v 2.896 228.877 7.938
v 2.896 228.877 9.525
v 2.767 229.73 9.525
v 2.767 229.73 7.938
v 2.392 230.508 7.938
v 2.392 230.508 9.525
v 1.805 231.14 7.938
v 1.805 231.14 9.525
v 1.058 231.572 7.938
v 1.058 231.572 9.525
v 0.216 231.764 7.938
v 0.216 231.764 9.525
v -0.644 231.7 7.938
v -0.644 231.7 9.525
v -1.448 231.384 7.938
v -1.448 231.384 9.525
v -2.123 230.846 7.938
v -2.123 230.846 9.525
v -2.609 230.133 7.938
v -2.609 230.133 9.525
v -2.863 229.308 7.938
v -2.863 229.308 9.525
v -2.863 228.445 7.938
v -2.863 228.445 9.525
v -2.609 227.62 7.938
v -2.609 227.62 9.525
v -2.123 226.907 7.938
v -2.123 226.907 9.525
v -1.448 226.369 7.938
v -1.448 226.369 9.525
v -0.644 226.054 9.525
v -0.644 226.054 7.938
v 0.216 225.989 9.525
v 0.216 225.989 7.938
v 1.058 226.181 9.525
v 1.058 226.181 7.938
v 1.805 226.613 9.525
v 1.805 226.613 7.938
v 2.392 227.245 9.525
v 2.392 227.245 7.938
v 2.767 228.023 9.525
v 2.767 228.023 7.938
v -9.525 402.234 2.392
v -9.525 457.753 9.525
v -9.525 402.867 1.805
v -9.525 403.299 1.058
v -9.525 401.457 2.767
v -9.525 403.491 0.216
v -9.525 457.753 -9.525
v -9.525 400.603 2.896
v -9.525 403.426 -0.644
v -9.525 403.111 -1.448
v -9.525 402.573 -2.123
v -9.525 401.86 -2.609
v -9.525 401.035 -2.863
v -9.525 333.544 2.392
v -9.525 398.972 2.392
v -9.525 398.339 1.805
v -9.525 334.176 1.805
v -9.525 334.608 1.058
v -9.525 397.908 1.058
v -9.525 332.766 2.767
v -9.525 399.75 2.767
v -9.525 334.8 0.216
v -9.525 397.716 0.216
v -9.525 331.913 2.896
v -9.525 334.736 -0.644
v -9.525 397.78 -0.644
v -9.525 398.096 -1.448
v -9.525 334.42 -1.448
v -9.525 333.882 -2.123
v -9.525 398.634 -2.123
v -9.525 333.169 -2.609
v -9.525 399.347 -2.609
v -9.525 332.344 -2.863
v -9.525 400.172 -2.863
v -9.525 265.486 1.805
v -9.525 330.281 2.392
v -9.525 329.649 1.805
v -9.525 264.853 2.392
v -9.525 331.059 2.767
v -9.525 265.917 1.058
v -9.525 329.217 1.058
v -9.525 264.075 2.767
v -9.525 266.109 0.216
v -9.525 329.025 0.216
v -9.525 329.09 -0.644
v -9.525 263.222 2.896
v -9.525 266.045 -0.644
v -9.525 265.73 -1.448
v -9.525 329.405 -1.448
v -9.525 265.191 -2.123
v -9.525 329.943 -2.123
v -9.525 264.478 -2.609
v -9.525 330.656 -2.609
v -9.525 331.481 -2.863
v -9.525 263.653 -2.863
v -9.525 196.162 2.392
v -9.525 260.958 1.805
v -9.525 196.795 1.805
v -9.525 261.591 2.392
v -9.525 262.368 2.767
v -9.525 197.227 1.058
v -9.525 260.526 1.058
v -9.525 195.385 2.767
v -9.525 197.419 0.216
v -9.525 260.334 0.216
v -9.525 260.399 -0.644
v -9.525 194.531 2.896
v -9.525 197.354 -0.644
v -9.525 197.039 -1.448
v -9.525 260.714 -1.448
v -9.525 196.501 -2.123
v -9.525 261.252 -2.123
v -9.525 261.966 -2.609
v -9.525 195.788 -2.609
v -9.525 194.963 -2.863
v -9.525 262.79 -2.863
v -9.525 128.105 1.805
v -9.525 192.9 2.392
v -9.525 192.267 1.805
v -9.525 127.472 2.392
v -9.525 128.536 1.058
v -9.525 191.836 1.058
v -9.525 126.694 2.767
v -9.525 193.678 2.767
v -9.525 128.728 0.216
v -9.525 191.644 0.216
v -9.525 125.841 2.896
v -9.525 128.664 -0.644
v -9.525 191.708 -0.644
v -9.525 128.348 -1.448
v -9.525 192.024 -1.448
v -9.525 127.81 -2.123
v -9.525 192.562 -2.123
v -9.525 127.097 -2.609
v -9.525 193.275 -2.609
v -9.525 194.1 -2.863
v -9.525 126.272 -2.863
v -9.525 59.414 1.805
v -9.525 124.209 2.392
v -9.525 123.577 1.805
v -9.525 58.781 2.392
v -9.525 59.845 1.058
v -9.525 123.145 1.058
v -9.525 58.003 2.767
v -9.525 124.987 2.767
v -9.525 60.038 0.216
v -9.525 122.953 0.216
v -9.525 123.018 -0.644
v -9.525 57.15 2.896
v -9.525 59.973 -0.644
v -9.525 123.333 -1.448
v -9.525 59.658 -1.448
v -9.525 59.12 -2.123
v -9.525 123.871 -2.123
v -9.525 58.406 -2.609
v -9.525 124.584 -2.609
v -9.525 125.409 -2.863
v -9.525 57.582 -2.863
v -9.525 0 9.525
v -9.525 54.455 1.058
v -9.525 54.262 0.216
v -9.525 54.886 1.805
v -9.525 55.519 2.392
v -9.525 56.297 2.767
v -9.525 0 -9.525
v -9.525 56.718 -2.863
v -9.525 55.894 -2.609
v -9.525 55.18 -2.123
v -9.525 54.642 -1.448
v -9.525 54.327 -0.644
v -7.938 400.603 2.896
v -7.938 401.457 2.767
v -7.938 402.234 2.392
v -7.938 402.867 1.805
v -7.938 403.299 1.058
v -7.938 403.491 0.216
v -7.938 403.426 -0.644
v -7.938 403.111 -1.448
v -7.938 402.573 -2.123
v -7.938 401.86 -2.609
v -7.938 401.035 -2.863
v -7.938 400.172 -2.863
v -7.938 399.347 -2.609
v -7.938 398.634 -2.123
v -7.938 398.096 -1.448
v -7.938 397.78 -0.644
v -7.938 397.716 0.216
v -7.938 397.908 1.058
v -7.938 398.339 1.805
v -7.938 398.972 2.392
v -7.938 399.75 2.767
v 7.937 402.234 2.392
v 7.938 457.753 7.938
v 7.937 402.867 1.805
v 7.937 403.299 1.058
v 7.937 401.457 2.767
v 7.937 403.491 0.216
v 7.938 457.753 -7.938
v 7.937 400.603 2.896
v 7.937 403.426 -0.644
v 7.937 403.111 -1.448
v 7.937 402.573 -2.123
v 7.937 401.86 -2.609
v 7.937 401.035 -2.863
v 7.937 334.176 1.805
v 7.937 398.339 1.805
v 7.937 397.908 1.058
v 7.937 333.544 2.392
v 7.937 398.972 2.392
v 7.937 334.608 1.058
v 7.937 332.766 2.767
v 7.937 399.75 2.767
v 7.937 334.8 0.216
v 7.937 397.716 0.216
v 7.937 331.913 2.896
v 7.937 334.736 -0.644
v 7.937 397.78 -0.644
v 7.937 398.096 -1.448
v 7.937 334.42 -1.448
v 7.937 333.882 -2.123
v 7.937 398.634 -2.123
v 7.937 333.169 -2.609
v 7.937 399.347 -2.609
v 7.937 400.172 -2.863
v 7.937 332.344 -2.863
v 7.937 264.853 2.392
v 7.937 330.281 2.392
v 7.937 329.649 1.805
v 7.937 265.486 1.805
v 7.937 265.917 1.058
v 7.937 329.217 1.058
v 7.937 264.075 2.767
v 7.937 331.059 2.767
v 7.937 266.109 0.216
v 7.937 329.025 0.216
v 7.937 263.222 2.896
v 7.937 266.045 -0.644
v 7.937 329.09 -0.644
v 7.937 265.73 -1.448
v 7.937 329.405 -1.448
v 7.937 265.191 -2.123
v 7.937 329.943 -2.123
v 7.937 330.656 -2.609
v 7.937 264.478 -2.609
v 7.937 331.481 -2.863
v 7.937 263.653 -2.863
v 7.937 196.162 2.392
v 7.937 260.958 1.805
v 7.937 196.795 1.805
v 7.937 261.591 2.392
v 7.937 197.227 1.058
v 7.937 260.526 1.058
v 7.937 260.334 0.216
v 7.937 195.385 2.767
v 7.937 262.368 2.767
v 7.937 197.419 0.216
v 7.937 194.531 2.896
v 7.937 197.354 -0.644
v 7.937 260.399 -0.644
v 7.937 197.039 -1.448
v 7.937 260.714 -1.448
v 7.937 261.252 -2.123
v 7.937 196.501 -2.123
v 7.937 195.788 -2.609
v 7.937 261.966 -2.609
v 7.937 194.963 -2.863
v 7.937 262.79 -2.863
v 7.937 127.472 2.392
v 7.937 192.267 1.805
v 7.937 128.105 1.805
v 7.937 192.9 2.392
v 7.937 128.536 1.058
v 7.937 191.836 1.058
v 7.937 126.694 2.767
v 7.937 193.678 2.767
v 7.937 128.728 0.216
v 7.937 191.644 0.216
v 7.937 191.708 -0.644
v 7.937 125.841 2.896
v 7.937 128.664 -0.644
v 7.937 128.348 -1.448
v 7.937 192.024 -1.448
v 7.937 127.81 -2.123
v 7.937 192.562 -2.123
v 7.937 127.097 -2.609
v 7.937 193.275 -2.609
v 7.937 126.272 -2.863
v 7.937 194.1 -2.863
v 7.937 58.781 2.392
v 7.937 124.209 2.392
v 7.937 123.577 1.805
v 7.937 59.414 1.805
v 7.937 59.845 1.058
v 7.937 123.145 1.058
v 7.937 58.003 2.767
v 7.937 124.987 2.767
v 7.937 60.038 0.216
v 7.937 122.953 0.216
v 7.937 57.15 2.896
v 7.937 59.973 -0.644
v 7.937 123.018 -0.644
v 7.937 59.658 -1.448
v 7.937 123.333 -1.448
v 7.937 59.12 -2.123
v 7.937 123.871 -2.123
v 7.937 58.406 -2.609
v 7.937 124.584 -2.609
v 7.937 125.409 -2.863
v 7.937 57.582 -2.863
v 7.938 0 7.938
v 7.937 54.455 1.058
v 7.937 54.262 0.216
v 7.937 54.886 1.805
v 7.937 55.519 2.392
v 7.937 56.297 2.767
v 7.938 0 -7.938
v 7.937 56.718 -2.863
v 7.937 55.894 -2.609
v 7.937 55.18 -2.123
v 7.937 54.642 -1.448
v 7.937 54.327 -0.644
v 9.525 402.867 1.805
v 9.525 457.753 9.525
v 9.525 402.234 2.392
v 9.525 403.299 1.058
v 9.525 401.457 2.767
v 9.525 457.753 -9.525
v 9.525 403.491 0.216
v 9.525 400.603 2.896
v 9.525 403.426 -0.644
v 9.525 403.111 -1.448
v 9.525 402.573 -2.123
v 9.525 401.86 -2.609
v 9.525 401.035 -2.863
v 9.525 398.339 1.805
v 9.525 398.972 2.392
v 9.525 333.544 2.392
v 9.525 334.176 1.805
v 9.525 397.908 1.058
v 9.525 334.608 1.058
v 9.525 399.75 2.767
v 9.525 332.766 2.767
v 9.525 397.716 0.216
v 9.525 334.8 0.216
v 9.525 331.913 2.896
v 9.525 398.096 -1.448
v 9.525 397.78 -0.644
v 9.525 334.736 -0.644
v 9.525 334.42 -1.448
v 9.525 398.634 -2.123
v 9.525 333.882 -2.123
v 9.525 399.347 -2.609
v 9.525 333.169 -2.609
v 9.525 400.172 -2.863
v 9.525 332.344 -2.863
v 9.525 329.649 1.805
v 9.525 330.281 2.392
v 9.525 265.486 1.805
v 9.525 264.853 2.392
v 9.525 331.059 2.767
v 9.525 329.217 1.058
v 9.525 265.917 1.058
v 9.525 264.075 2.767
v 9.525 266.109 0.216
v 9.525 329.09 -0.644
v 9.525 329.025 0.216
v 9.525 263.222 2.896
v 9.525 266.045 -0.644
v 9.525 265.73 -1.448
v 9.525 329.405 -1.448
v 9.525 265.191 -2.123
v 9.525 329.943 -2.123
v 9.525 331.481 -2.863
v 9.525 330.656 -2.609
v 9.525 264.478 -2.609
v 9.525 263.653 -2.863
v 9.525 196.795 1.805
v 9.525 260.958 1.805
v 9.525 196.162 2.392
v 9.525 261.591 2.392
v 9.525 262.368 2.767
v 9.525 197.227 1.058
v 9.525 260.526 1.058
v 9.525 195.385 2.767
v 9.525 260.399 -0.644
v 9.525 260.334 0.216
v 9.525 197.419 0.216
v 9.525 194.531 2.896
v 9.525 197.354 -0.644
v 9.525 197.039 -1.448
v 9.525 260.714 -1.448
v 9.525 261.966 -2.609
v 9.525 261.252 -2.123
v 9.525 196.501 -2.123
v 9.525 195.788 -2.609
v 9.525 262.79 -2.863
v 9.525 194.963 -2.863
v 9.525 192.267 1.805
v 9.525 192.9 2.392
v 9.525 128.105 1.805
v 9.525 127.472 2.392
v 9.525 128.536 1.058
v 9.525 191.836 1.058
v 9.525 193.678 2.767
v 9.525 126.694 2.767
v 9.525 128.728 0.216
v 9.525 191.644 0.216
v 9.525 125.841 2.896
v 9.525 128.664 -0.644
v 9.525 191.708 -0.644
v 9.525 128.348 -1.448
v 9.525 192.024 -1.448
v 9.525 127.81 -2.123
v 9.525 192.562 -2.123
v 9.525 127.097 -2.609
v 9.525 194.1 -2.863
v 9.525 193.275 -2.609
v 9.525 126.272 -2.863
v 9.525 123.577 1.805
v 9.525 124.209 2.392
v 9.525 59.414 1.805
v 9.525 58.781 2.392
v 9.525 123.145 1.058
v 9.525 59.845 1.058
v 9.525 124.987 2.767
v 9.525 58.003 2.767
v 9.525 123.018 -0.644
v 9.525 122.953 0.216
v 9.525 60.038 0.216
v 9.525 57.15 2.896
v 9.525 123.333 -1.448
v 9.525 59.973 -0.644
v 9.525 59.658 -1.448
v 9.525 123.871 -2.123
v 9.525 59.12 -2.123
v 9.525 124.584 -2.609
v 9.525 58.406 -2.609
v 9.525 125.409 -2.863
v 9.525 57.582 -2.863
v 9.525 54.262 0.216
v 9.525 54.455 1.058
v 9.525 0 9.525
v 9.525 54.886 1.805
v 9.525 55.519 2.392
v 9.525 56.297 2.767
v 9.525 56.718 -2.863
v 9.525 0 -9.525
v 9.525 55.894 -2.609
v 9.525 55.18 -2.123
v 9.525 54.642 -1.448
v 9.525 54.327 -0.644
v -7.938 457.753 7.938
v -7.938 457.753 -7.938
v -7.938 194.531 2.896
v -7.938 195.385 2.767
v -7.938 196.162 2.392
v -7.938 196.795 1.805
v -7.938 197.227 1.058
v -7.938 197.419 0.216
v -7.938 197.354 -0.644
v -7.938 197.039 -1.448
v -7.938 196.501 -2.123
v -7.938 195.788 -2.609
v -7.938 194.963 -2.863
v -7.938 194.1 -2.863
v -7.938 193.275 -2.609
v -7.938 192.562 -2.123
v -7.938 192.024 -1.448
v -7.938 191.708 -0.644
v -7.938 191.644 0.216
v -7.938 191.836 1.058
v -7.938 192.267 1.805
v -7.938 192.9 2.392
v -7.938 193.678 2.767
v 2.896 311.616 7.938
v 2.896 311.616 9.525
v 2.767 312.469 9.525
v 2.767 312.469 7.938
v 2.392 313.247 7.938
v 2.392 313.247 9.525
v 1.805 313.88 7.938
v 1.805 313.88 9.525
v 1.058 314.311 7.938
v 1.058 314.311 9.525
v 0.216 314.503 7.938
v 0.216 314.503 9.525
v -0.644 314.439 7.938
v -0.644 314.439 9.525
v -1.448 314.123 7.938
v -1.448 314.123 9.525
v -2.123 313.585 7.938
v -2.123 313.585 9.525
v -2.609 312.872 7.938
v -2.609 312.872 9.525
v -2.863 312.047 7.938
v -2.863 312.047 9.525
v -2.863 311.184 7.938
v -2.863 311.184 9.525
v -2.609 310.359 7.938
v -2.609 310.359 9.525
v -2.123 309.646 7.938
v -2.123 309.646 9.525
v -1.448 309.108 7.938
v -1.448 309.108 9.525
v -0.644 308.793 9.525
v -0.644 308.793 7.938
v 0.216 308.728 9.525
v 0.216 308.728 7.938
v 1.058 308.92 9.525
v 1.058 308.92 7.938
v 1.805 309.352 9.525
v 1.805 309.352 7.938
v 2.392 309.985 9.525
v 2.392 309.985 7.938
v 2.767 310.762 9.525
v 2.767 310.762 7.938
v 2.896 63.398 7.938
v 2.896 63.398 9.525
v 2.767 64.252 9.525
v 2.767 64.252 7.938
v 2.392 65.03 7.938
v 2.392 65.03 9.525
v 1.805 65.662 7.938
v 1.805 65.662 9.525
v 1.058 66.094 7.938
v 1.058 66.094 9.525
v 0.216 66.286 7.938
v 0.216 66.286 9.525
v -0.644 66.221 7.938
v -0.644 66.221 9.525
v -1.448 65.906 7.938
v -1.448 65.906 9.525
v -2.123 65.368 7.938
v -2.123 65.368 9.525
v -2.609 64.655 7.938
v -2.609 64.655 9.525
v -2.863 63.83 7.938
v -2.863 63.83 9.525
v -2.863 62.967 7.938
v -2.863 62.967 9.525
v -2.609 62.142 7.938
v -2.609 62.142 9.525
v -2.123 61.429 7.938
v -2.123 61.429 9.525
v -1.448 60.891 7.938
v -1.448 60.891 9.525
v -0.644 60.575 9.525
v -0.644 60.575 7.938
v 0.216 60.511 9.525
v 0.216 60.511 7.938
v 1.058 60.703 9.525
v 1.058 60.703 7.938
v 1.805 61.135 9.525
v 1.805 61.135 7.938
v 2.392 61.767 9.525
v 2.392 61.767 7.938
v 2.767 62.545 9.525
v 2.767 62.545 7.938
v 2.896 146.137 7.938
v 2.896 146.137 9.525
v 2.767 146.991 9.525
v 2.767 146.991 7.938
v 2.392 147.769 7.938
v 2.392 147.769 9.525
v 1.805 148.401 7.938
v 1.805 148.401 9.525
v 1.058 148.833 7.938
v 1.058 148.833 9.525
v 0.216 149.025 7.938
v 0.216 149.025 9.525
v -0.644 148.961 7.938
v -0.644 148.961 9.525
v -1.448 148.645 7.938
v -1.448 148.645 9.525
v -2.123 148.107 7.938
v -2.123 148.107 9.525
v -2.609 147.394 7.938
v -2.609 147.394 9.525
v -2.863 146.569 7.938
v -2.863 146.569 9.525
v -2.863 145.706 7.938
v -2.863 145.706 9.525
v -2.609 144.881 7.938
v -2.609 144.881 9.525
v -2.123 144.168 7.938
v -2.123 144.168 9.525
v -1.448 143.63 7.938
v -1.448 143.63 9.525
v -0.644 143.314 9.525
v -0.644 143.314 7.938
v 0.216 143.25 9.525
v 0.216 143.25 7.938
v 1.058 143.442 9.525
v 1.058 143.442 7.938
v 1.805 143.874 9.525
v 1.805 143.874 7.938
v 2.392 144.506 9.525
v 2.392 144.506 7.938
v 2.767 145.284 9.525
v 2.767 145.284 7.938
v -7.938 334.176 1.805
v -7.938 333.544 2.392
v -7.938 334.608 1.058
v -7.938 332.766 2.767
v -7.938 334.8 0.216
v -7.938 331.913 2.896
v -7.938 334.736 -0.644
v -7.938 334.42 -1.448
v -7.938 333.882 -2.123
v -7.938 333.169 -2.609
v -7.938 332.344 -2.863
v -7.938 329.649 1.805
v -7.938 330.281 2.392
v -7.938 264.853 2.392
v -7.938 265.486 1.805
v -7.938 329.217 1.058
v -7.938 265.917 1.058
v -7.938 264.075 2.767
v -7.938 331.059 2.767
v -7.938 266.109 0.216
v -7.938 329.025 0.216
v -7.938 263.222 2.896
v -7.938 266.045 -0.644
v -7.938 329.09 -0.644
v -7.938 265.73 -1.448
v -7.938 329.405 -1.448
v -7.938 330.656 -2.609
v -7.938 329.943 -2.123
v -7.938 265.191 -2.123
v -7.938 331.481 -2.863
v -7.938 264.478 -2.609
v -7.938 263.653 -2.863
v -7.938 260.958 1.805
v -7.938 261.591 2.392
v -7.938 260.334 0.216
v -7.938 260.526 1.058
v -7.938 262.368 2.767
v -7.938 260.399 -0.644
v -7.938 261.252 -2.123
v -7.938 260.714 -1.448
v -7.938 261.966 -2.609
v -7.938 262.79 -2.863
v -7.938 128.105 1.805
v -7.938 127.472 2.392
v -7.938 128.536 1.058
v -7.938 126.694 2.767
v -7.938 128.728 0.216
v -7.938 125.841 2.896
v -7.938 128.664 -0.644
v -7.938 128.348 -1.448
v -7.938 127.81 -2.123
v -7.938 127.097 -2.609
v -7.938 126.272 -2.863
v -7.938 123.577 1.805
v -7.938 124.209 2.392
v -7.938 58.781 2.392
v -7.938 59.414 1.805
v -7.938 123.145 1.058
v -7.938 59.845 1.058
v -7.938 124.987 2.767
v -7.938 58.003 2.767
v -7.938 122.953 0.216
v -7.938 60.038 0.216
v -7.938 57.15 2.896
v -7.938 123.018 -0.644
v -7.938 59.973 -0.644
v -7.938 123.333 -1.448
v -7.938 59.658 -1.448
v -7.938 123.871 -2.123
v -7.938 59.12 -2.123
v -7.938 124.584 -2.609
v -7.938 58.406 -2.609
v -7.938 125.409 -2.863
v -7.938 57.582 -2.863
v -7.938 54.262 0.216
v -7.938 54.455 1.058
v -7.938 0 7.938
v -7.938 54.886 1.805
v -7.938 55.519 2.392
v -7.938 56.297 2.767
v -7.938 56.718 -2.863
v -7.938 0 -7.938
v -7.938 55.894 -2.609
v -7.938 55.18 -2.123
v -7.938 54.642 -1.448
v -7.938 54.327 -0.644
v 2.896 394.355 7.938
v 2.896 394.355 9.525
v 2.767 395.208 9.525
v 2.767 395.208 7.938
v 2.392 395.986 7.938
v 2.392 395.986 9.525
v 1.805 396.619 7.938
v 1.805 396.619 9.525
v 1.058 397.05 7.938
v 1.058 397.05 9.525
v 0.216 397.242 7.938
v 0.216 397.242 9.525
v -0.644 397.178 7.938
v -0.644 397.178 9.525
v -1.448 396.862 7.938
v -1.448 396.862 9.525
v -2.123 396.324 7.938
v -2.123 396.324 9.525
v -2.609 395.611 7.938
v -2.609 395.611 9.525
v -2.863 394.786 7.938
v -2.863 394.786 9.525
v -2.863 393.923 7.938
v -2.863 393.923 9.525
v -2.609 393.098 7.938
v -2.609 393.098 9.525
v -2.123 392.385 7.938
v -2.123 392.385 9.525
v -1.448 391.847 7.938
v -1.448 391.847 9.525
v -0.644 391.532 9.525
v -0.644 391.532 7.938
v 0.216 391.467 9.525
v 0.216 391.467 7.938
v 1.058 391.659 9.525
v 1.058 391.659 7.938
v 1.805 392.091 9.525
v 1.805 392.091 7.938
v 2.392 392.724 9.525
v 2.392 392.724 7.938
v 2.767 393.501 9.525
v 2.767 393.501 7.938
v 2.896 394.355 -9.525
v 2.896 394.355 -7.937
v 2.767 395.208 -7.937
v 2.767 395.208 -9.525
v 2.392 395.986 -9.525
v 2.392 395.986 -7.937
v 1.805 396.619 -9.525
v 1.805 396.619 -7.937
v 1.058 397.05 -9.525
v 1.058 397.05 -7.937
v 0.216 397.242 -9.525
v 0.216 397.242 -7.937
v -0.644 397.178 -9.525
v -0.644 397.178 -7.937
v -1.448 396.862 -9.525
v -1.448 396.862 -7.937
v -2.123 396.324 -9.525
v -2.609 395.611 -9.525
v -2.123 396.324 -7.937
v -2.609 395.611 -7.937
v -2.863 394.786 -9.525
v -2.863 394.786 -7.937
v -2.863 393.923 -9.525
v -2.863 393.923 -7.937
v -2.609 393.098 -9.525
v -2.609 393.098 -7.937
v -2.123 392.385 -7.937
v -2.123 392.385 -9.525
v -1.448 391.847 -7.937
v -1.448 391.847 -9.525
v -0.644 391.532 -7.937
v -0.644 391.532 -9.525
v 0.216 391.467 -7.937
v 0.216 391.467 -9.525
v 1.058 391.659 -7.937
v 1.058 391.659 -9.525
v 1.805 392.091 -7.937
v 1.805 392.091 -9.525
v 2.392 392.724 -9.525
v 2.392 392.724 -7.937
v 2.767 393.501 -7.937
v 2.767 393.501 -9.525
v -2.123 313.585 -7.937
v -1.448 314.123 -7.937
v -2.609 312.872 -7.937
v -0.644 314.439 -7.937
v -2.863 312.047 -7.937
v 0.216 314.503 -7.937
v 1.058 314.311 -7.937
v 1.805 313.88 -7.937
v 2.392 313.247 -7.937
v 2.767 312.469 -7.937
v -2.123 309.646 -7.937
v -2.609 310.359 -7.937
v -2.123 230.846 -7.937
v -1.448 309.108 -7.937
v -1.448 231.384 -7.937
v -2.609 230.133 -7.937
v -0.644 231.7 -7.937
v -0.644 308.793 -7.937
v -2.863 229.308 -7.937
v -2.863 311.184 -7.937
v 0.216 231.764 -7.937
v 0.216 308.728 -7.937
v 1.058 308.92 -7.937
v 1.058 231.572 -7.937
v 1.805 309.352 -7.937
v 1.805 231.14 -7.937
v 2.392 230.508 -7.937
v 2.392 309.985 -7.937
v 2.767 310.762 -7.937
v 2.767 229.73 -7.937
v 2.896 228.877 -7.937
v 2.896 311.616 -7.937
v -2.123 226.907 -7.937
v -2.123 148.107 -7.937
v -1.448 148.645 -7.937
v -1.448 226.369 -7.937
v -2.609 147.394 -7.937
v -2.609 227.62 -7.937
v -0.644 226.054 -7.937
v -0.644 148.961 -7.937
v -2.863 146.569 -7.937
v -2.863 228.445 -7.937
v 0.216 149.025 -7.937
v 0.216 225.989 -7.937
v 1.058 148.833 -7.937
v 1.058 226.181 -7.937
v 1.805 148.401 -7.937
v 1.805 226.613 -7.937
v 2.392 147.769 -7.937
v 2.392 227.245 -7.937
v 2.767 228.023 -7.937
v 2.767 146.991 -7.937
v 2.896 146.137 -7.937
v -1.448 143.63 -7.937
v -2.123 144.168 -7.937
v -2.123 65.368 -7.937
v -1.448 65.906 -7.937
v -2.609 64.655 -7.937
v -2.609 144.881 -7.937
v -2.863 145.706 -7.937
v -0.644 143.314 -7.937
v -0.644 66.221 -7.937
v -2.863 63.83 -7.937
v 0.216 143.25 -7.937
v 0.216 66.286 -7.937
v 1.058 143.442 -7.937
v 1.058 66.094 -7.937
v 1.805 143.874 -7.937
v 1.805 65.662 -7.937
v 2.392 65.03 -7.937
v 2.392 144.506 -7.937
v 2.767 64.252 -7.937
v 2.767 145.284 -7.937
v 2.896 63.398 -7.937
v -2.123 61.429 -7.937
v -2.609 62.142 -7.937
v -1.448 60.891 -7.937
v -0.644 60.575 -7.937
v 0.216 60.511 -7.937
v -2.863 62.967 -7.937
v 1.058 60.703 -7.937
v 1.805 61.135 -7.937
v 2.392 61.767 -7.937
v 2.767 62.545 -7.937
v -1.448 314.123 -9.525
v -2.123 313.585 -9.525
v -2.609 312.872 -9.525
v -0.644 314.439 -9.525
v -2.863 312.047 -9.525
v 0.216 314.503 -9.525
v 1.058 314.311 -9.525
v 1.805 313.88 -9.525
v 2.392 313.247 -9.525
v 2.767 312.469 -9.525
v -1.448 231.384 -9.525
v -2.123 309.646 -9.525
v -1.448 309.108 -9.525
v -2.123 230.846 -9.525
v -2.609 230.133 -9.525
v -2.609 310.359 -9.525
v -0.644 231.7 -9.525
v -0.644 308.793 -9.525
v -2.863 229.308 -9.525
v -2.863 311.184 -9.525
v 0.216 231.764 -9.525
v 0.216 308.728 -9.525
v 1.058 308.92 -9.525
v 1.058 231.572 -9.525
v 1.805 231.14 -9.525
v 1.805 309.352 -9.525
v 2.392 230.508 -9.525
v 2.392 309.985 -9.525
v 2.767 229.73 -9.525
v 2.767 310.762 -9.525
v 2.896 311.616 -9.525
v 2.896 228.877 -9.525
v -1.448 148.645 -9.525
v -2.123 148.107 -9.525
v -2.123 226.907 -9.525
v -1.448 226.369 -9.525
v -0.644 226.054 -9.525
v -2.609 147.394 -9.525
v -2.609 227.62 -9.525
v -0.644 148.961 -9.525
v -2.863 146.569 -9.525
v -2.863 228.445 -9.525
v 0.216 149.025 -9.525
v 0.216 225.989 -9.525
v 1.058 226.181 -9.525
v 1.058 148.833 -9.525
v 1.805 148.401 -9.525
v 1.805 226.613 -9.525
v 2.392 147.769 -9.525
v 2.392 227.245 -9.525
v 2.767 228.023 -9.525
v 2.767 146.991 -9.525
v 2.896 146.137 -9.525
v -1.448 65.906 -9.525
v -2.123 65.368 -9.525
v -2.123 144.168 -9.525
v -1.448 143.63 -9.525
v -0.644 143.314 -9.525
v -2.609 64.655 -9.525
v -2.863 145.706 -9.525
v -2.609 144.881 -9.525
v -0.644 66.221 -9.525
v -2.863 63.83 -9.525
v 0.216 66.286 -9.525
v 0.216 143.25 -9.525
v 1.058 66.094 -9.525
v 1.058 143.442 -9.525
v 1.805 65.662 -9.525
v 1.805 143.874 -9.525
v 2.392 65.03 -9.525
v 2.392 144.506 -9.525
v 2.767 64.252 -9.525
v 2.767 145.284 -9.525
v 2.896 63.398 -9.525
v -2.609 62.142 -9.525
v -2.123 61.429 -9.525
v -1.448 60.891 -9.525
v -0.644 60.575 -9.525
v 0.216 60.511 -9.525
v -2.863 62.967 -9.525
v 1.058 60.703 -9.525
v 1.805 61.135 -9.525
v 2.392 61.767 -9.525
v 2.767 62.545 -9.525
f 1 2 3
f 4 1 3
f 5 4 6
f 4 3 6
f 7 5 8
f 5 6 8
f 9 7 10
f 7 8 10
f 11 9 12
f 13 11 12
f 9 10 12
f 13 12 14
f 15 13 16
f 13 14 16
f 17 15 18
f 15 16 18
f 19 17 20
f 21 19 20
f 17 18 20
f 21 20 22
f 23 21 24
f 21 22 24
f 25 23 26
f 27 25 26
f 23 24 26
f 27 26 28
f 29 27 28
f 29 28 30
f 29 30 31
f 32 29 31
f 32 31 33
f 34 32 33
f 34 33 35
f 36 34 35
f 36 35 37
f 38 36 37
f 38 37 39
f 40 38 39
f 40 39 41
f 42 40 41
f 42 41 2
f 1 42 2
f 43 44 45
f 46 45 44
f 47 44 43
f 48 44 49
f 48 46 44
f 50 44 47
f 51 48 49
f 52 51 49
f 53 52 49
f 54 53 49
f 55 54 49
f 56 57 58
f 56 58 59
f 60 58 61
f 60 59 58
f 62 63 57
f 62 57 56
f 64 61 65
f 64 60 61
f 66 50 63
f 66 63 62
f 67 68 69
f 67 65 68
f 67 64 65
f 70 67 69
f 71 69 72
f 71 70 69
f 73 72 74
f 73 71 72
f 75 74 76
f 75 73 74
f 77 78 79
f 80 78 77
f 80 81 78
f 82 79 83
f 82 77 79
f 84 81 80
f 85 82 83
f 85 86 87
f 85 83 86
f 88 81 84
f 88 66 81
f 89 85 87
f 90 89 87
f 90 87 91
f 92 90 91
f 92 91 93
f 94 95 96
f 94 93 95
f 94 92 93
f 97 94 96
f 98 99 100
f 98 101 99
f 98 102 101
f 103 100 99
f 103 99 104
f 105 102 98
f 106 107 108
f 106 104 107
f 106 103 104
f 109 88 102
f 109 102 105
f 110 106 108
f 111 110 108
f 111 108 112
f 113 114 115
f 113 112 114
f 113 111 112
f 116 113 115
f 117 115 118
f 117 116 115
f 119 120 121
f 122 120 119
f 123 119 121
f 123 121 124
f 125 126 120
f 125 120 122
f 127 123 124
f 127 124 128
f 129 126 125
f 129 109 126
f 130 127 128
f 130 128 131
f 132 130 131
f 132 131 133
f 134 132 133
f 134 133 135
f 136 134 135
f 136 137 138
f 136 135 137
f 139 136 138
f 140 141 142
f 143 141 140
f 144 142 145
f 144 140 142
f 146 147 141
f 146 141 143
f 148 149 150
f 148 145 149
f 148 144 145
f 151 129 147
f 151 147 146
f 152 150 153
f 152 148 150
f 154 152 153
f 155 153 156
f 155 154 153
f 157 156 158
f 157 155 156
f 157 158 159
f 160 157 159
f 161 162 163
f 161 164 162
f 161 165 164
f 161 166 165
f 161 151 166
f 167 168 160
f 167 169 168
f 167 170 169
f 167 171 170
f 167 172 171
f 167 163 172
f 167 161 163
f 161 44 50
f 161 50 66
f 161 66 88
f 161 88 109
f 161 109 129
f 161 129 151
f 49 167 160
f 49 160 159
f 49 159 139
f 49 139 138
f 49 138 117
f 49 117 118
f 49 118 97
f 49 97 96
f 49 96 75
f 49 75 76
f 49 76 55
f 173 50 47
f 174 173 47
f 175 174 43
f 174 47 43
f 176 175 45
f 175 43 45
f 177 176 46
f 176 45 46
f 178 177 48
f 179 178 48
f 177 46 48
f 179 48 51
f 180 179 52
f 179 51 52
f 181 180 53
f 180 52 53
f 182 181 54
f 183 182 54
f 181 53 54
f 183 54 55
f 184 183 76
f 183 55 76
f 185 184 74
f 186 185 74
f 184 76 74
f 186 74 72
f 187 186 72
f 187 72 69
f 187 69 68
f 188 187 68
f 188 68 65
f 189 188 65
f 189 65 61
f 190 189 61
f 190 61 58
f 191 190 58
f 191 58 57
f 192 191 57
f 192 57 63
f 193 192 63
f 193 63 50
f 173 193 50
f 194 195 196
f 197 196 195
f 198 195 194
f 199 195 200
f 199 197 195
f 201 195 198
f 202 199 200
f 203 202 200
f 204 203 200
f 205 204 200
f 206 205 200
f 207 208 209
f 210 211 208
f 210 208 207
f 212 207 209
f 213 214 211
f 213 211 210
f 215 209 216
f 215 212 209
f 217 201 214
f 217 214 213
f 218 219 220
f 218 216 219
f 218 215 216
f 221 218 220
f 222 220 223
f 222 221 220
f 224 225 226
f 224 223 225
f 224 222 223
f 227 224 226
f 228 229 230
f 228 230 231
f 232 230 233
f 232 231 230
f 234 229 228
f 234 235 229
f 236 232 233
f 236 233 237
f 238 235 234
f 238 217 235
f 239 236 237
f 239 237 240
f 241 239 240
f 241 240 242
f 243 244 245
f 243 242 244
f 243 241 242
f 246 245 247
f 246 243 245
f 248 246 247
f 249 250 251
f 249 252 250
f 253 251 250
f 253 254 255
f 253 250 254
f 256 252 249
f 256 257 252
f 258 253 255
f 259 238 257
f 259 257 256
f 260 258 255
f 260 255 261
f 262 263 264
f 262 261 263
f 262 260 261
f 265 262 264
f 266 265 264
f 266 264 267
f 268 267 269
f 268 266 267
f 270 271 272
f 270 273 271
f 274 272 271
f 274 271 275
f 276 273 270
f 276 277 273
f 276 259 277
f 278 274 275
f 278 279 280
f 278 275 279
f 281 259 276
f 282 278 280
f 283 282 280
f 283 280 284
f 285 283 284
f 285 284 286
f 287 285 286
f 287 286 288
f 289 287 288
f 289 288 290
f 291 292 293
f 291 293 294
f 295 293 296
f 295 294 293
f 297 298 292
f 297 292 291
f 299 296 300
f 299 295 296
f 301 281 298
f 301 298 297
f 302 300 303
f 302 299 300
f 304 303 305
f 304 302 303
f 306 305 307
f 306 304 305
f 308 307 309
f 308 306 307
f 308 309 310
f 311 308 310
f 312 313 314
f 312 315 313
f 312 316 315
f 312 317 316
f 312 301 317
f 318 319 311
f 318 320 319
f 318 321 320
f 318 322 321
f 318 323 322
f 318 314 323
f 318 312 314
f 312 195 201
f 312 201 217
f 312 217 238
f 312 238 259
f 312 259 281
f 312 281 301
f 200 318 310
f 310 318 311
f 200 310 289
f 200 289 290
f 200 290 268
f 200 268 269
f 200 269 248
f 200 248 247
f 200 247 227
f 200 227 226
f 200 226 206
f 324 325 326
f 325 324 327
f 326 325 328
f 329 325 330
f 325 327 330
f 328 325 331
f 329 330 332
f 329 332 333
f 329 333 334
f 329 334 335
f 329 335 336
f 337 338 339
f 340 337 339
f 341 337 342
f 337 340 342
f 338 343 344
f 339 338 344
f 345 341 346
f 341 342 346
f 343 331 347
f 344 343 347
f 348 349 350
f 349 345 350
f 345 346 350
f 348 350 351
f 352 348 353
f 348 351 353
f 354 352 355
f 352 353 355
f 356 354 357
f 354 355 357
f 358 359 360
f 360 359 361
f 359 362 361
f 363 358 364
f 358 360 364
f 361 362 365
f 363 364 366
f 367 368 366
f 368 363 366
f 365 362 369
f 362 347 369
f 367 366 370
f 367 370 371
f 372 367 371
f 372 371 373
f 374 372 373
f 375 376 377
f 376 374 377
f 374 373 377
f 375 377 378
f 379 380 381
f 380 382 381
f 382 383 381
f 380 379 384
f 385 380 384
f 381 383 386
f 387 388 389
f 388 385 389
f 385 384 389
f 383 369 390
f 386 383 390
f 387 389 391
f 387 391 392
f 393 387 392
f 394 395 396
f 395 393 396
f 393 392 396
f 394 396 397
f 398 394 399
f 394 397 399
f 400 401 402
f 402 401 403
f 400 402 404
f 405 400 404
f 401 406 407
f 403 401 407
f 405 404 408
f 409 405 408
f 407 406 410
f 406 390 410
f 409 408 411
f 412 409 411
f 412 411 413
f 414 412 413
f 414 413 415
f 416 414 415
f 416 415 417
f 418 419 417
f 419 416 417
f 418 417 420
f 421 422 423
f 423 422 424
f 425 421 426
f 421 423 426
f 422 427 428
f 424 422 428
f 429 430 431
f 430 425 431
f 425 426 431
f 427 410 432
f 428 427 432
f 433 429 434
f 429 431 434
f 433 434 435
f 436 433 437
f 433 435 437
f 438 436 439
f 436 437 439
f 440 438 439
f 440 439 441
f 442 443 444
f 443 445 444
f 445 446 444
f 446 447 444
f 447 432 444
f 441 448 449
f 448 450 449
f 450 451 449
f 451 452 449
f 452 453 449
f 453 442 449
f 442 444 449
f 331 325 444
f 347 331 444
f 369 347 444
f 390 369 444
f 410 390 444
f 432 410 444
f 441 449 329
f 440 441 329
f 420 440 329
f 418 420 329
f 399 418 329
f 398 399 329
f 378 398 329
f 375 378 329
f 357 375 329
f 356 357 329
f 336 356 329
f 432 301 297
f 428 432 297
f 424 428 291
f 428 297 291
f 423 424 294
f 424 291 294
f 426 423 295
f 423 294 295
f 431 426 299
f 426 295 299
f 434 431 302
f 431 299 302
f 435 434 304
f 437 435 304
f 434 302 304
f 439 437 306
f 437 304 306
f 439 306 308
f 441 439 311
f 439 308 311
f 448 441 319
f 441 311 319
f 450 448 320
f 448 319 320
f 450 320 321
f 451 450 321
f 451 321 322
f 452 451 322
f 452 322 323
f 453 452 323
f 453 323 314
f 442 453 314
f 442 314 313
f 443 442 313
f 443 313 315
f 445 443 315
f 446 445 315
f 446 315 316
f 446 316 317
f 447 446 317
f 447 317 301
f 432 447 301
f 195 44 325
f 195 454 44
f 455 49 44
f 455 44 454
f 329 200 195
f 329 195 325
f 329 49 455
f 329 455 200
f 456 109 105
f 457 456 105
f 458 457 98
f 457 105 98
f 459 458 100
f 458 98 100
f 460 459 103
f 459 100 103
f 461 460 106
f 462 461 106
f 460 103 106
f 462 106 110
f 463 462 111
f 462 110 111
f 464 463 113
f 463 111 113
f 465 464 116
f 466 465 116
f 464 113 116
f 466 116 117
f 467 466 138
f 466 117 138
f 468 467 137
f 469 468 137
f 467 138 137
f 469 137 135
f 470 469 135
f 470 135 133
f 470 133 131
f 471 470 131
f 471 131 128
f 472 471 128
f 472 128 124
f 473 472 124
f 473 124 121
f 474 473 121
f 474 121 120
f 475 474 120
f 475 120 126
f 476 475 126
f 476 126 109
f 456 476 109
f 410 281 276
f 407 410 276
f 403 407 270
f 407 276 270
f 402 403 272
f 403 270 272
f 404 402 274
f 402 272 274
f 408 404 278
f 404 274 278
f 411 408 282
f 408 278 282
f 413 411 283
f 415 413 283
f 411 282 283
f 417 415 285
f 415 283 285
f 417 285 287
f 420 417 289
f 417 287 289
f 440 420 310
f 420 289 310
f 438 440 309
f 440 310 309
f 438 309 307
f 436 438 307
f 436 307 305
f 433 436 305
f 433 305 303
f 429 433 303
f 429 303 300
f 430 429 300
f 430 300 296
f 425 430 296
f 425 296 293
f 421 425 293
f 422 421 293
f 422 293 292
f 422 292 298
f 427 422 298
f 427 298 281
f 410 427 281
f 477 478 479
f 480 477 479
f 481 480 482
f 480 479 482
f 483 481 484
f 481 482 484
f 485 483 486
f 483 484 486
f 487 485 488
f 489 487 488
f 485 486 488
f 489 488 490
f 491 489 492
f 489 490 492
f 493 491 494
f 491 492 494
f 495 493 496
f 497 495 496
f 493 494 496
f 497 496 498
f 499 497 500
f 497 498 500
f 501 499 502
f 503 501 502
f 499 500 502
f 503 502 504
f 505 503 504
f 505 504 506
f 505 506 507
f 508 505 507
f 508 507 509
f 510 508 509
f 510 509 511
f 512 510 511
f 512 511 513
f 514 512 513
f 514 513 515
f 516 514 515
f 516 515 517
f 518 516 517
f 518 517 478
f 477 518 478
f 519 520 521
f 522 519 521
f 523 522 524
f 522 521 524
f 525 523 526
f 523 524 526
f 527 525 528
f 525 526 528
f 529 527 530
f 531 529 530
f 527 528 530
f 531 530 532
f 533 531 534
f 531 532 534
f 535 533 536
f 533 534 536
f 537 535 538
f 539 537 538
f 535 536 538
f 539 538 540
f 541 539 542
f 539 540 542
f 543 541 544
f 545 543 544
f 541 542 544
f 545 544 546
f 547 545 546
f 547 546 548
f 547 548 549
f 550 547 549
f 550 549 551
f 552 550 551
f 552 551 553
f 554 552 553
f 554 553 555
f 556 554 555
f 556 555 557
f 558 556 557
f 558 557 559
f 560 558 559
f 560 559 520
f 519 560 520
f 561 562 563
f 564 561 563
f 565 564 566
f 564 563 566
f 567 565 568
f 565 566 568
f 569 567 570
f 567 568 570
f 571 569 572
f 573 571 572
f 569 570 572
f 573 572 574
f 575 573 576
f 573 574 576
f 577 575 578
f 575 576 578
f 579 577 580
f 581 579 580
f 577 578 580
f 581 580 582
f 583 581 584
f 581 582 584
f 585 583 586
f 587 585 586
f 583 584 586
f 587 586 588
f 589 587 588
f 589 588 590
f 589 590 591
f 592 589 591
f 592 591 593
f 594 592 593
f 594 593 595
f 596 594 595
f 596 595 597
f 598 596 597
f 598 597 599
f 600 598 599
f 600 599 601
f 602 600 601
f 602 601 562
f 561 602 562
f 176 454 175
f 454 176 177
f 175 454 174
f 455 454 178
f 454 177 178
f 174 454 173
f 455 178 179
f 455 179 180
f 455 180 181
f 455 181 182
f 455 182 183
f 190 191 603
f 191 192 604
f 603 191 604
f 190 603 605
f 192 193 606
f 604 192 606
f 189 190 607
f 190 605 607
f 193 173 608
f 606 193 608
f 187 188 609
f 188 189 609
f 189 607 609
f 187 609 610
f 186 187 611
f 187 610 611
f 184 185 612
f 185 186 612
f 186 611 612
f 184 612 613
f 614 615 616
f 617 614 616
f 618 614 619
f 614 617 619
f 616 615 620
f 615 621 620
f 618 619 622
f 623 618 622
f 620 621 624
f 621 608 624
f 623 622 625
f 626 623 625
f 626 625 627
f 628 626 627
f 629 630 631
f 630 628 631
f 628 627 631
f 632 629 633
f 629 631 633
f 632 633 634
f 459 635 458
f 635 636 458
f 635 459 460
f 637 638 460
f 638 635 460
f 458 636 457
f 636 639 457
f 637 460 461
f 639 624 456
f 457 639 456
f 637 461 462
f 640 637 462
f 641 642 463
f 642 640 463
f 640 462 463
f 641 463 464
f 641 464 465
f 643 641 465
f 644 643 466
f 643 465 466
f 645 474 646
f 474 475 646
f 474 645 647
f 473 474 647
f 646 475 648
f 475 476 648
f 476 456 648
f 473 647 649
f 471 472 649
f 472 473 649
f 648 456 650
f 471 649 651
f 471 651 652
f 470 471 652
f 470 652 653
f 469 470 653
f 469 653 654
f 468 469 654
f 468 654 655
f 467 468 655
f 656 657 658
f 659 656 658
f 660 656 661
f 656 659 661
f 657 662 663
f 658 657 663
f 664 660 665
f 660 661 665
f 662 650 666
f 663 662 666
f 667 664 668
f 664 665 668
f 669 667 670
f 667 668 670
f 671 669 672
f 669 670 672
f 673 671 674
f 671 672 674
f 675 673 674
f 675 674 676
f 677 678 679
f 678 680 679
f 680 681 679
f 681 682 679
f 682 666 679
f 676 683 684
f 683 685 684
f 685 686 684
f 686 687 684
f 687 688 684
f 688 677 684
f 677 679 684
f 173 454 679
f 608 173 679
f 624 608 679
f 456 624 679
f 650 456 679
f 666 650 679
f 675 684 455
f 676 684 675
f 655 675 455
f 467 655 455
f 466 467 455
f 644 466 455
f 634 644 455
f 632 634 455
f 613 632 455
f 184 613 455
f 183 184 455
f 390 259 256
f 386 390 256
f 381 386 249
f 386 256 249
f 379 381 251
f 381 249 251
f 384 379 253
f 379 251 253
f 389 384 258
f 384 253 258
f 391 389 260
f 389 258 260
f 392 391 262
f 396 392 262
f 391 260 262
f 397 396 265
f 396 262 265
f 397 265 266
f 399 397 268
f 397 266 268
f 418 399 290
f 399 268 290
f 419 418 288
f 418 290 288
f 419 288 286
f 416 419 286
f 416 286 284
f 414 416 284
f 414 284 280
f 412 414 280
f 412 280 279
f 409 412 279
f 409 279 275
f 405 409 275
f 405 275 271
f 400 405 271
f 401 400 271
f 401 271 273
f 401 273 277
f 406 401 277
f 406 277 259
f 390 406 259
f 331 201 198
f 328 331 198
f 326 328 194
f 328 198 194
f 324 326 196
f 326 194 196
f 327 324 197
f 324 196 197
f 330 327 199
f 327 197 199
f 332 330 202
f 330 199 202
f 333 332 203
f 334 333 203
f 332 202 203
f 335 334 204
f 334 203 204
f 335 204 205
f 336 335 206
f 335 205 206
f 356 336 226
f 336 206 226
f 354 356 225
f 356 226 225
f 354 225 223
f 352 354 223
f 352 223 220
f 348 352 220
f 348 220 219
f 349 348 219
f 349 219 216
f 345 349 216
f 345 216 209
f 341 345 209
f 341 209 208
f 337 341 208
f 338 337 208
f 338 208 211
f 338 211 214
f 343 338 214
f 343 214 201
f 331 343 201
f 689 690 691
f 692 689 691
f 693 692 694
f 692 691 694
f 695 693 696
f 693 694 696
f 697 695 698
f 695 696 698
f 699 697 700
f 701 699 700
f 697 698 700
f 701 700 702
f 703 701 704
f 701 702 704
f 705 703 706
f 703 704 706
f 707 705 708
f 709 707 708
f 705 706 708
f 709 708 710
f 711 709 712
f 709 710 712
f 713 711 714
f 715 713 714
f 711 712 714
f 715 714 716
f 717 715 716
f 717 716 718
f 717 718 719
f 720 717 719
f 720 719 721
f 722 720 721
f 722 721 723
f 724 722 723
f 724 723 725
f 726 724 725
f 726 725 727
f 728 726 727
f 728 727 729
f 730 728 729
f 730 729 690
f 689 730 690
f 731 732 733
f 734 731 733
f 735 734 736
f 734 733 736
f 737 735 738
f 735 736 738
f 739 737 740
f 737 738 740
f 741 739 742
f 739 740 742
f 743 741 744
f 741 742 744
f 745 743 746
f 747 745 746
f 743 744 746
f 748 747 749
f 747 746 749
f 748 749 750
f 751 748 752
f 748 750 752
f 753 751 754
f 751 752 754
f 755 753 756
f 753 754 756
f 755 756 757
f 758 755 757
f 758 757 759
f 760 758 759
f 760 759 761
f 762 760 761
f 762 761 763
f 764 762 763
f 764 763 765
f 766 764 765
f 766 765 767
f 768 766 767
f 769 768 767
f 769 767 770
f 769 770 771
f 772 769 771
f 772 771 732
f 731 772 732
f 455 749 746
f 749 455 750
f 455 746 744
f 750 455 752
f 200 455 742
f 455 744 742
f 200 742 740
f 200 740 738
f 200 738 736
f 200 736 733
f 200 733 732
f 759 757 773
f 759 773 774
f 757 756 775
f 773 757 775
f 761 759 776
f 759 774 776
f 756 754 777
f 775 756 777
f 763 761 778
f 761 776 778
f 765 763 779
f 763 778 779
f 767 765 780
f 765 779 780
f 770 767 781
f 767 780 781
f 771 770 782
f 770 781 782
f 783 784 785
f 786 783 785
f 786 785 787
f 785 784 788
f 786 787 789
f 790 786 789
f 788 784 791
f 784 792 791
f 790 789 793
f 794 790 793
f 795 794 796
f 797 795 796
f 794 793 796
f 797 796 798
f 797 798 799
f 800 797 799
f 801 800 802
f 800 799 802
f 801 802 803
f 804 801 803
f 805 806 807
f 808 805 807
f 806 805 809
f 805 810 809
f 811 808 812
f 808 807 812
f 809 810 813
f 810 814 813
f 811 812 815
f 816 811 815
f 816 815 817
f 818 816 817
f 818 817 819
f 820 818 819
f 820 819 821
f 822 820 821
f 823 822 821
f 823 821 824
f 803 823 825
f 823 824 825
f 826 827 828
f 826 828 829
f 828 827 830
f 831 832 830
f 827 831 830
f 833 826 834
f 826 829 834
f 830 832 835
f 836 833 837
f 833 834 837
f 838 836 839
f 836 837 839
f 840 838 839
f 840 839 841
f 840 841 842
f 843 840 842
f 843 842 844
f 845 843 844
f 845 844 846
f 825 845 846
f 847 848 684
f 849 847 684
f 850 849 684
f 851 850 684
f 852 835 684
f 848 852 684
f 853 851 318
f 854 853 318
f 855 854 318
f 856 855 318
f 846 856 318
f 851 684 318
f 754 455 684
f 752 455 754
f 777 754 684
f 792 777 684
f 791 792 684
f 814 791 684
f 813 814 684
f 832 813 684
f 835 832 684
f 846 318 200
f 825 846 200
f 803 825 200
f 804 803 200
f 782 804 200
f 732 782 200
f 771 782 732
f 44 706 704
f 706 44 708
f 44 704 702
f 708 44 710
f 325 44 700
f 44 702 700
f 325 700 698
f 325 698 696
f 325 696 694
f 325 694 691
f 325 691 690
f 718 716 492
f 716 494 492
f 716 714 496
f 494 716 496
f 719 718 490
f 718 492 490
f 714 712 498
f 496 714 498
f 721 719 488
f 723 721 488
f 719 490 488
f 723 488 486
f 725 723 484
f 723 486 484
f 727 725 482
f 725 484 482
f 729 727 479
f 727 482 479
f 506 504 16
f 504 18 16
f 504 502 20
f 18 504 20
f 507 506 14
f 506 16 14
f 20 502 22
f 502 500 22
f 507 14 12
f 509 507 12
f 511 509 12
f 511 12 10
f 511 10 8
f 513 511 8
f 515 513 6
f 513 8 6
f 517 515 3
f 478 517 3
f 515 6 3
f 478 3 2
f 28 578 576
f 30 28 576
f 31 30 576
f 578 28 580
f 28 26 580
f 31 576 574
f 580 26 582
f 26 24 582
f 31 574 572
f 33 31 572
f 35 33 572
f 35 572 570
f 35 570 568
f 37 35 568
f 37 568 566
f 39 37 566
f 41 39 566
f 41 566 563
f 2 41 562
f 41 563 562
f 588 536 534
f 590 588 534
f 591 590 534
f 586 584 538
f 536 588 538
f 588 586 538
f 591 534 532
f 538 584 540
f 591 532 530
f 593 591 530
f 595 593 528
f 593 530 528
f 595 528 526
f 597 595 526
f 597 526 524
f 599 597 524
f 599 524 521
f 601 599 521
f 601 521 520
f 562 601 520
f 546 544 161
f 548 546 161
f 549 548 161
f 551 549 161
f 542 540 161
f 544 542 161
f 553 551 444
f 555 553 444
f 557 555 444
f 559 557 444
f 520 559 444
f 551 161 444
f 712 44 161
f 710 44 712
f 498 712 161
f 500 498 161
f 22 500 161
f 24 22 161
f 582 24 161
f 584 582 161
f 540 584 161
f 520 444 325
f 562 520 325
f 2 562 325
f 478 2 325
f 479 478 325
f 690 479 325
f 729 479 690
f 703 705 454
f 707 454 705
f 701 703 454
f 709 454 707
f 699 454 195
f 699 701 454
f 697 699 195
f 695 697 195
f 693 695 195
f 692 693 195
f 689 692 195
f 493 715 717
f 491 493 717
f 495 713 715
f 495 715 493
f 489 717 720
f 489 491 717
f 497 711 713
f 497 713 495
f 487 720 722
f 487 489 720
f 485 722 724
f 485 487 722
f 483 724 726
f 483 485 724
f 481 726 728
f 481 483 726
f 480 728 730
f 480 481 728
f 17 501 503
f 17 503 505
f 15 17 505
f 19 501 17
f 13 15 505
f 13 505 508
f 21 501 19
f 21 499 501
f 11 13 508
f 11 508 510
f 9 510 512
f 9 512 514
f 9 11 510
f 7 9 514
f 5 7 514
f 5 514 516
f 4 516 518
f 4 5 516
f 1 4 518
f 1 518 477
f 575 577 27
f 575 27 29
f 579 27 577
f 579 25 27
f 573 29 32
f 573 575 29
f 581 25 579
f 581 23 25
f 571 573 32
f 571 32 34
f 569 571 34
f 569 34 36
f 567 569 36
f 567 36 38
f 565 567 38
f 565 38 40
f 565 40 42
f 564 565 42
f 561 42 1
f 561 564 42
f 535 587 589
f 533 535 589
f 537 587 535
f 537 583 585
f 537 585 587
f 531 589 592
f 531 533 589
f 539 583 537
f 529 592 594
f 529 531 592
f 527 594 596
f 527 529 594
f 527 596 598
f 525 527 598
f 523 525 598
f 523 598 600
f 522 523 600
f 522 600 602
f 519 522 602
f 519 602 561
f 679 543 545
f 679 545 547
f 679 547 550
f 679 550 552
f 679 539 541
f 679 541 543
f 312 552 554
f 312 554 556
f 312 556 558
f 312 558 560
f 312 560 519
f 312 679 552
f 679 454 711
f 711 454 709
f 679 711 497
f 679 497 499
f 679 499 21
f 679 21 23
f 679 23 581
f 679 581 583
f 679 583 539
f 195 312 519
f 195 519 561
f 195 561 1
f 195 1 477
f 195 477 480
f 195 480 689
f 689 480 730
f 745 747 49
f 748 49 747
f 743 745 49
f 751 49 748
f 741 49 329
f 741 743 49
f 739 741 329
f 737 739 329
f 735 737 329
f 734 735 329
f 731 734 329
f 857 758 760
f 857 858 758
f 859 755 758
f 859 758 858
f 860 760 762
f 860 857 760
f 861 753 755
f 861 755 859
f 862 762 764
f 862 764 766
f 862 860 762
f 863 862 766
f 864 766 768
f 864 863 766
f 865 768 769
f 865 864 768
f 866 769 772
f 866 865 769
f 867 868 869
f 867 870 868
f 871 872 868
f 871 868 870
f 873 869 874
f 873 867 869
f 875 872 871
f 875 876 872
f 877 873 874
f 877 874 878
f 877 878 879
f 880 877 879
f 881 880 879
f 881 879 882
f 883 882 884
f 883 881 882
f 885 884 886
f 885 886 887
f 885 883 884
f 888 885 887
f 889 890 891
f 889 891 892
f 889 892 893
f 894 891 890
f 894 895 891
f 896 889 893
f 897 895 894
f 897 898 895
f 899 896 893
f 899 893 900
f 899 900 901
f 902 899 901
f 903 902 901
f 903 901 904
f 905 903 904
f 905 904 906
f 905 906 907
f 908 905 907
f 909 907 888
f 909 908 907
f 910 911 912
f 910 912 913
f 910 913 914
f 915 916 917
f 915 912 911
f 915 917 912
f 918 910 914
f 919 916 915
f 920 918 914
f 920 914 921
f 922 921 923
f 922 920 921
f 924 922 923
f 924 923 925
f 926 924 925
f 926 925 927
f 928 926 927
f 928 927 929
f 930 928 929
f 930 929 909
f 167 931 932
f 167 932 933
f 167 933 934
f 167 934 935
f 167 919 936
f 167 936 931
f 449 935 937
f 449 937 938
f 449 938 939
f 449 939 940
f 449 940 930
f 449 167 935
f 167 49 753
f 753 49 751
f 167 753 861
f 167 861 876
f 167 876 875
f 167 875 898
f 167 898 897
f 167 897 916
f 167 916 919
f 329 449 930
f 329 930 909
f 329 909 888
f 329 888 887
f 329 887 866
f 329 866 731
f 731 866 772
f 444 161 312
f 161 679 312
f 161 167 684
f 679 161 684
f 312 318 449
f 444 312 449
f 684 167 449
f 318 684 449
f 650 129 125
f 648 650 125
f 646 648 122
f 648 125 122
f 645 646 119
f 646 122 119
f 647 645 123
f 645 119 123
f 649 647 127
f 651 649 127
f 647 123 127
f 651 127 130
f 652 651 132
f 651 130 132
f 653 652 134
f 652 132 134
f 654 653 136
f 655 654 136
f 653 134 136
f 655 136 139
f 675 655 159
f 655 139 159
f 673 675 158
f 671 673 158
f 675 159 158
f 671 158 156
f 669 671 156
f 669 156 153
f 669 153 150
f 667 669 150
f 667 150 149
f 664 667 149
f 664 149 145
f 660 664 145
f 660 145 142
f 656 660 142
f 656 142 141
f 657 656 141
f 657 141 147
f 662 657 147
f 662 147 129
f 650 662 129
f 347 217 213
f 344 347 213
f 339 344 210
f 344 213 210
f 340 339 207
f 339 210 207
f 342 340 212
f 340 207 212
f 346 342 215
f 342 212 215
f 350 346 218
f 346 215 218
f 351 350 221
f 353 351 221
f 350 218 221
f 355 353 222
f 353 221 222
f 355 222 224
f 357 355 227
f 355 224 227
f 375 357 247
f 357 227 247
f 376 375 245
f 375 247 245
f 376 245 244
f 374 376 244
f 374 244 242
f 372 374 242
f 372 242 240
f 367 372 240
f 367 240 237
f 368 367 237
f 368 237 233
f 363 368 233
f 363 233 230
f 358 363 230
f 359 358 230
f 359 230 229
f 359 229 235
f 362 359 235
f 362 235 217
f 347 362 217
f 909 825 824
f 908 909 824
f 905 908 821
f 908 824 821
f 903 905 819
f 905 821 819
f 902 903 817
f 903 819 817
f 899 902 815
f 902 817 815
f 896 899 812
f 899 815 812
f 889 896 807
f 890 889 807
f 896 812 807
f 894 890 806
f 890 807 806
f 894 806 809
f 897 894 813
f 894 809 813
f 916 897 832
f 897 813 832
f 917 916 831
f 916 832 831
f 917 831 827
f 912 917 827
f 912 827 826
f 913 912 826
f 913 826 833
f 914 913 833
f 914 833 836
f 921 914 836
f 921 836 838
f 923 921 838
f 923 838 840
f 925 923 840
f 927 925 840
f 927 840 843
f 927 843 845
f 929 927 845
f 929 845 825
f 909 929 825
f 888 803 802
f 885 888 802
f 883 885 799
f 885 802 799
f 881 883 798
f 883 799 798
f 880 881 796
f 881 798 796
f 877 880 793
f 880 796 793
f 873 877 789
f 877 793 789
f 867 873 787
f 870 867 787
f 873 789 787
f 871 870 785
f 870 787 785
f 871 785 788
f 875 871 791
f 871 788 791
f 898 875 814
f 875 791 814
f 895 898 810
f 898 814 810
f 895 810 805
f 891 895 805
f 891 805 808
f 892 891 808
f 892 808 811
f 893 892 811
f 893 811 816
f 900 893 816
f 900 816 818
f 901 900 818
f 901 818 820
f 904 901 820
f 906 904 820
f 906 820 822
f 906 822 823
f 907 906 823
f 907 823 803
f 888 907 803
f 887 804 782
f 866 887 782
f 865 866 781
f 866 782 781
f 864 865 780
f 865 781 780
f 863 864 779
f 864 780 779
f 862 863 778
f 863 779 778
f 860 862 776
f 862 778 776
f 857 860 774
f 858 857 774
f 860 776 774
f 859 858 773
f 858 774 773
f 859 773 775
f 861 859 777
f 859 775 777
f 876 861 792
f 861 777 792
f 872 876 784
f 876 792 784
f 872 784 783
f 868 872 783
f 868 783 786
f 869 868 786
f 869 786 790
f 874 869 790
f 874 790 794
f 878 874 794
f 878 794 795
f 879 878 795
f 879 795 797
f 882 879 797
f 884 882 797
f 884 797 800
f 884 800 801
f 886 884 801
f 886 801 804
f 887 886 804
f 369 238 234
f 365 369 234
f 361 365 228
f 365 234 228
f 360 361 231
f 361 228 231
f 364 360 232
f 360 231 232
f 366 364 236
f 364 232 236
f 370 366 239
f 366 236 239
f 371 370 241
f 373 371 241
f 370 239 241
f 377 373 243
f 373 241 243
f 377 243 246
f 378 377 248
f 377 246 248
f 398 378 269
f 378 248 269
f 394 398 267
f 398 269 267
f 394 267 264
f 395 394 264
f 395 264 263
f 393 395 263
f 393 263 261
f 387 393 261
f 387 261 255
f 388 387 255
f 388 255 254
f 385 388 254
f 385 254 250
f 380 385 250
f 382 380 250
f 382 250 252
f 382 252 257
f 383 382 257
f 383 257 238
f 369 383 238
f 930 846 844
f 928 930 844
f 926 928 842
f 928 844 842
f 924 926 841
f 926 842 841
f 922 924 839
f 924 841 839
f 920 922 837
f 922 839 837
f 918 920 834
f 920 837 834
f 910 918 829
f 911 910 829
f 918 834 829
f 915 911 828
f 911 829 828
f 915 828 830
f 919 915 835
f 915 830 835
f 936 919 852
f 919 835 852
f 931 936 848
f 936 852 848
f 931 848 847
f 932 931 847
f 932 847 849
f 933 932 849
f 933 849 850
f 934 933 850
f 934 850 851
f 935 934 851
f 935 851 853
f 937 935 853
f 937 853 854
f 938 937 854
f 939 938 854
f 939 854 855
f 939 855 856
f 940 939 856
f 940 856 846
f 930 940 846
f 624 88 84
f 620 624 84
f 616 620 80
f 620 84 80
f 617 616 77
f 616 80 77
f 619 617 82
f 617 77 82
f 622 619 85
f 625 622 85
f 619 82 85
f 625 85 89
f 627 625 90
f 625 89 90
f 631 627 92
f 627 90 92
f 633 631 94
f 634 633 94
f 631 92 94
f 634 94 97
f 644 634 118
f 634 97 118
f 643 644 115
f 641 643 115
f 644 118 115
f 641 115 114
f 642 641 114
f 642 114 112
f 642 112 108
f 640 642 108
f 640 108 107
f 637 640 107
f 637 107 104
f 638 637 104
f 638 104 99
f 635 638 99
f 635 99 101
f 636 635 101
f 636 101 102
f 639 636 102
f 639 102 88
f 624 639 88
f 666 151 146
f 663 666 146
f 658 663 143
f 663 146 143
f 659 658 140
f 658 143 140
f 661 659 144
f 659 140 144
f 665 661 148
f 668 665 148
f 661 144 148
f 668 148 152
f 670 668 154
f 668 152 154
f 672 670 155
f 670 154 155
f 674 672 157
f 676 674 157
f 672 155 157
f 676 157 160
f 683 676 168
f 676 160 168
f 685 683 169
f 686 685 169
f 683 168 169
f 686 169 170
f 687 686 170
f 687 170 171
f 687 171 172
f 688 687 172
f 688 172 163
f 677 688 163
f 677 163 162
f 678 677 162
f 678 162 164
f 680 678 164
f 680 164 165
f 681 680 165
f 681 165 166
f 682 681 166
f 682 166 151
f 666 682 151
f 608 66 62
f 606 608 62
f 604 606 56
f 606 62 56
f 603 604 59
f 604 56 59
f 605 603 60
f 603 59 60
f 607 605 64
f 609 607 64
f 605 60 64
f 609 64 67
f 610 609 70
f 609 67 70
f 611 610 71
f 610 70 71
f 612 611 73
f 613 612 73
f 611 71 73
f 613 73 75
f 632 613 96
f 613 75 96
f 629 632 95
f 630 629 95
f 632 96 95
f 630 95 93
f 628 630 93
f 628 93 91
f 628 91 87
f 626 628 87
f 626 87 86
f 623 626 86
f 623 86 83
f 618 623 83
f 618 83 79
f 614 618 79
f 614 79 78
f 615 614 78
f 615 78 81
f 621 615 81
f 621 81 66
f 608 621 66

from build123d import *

# Parameters (mm, degrees)
SKETCH1_W                 = 19.05
SKETCH1_H                 = 19.05
SKETCH1_W_2               = 15.875
SKETCH1_H_2               = 15.875
TUBE_DEPTH                = 457.753199808
SKETCH2_R                 = 2.8956
TOPPLATEHOLES_DEPTH       = 459.24842614
LPATTERN1_COUNT           = 5
LPATTERN1_PITCH           = 82.739099952
SKETCH3_R                 = 2.8956
SIDEPLATEHOLEMASTER_DEPTH = 459.24842614
LPATTERN2_COUNT           = 6
LPATTERN2_PITCH           = 68.690639962


with BuildPart() as part:
    # Sketch1 → Tube (new body)
    with BuildSketch(Plane(origin=(0, 0, 0), x_dir=(1, 0, 0), z_dir=(0, 1, 0))):
        Rectangle(SKETCH1_W, SKETCH1_H)
        Rectangle(SKETCH1_W_2, SKETCH1_H_2, mode=Mode.SUBTRACT)
    extrude(amount=TUBE_DEPTH)

    # Sketch2 → TopPlateHoles (cut, through all)
    with BuildSketch(Plane.XY.offset(9.525)):
        with Locations((0, 394.354799808)):
            Circle(SKETCH2_R)
    topplateholes = extrude(amount=-TOPPLATEHOLES_DEPTH, mode=Mode.SUBTRACT)

    # LPattern1: TopPlateHoles ×5
    with Locations(*[(0, -i * LPATTERN1_PITCH, 0) for i in range(1, LPATTERN1_COUNT)]):
        add(topplateholes, mode=Mode.SUBTRACT)

    # Sketch3 → SidePlateHoleMaster (cut, through all)
    with BuildSketch(Plane.ZY.offset(9.525)):
        with Locations((0, 400.603199808)):
            Circle(SKETCH3_R)
    sideplateholemaster = extrude(amount=-SIDEPLATEHOLEMASTER_DEPTH, mode=Mode.SUBTRACT)

    # LPattern2: SidePlateHoleMaster ×6
    with Locations(*[(0, -i * LPATTERN2_PITCH, 0) for i in range(1, LPATTERN2_COUNT)]):
        add(sideplateholemaster, mode=Mode.SUBTRACT)


solid = part.part
